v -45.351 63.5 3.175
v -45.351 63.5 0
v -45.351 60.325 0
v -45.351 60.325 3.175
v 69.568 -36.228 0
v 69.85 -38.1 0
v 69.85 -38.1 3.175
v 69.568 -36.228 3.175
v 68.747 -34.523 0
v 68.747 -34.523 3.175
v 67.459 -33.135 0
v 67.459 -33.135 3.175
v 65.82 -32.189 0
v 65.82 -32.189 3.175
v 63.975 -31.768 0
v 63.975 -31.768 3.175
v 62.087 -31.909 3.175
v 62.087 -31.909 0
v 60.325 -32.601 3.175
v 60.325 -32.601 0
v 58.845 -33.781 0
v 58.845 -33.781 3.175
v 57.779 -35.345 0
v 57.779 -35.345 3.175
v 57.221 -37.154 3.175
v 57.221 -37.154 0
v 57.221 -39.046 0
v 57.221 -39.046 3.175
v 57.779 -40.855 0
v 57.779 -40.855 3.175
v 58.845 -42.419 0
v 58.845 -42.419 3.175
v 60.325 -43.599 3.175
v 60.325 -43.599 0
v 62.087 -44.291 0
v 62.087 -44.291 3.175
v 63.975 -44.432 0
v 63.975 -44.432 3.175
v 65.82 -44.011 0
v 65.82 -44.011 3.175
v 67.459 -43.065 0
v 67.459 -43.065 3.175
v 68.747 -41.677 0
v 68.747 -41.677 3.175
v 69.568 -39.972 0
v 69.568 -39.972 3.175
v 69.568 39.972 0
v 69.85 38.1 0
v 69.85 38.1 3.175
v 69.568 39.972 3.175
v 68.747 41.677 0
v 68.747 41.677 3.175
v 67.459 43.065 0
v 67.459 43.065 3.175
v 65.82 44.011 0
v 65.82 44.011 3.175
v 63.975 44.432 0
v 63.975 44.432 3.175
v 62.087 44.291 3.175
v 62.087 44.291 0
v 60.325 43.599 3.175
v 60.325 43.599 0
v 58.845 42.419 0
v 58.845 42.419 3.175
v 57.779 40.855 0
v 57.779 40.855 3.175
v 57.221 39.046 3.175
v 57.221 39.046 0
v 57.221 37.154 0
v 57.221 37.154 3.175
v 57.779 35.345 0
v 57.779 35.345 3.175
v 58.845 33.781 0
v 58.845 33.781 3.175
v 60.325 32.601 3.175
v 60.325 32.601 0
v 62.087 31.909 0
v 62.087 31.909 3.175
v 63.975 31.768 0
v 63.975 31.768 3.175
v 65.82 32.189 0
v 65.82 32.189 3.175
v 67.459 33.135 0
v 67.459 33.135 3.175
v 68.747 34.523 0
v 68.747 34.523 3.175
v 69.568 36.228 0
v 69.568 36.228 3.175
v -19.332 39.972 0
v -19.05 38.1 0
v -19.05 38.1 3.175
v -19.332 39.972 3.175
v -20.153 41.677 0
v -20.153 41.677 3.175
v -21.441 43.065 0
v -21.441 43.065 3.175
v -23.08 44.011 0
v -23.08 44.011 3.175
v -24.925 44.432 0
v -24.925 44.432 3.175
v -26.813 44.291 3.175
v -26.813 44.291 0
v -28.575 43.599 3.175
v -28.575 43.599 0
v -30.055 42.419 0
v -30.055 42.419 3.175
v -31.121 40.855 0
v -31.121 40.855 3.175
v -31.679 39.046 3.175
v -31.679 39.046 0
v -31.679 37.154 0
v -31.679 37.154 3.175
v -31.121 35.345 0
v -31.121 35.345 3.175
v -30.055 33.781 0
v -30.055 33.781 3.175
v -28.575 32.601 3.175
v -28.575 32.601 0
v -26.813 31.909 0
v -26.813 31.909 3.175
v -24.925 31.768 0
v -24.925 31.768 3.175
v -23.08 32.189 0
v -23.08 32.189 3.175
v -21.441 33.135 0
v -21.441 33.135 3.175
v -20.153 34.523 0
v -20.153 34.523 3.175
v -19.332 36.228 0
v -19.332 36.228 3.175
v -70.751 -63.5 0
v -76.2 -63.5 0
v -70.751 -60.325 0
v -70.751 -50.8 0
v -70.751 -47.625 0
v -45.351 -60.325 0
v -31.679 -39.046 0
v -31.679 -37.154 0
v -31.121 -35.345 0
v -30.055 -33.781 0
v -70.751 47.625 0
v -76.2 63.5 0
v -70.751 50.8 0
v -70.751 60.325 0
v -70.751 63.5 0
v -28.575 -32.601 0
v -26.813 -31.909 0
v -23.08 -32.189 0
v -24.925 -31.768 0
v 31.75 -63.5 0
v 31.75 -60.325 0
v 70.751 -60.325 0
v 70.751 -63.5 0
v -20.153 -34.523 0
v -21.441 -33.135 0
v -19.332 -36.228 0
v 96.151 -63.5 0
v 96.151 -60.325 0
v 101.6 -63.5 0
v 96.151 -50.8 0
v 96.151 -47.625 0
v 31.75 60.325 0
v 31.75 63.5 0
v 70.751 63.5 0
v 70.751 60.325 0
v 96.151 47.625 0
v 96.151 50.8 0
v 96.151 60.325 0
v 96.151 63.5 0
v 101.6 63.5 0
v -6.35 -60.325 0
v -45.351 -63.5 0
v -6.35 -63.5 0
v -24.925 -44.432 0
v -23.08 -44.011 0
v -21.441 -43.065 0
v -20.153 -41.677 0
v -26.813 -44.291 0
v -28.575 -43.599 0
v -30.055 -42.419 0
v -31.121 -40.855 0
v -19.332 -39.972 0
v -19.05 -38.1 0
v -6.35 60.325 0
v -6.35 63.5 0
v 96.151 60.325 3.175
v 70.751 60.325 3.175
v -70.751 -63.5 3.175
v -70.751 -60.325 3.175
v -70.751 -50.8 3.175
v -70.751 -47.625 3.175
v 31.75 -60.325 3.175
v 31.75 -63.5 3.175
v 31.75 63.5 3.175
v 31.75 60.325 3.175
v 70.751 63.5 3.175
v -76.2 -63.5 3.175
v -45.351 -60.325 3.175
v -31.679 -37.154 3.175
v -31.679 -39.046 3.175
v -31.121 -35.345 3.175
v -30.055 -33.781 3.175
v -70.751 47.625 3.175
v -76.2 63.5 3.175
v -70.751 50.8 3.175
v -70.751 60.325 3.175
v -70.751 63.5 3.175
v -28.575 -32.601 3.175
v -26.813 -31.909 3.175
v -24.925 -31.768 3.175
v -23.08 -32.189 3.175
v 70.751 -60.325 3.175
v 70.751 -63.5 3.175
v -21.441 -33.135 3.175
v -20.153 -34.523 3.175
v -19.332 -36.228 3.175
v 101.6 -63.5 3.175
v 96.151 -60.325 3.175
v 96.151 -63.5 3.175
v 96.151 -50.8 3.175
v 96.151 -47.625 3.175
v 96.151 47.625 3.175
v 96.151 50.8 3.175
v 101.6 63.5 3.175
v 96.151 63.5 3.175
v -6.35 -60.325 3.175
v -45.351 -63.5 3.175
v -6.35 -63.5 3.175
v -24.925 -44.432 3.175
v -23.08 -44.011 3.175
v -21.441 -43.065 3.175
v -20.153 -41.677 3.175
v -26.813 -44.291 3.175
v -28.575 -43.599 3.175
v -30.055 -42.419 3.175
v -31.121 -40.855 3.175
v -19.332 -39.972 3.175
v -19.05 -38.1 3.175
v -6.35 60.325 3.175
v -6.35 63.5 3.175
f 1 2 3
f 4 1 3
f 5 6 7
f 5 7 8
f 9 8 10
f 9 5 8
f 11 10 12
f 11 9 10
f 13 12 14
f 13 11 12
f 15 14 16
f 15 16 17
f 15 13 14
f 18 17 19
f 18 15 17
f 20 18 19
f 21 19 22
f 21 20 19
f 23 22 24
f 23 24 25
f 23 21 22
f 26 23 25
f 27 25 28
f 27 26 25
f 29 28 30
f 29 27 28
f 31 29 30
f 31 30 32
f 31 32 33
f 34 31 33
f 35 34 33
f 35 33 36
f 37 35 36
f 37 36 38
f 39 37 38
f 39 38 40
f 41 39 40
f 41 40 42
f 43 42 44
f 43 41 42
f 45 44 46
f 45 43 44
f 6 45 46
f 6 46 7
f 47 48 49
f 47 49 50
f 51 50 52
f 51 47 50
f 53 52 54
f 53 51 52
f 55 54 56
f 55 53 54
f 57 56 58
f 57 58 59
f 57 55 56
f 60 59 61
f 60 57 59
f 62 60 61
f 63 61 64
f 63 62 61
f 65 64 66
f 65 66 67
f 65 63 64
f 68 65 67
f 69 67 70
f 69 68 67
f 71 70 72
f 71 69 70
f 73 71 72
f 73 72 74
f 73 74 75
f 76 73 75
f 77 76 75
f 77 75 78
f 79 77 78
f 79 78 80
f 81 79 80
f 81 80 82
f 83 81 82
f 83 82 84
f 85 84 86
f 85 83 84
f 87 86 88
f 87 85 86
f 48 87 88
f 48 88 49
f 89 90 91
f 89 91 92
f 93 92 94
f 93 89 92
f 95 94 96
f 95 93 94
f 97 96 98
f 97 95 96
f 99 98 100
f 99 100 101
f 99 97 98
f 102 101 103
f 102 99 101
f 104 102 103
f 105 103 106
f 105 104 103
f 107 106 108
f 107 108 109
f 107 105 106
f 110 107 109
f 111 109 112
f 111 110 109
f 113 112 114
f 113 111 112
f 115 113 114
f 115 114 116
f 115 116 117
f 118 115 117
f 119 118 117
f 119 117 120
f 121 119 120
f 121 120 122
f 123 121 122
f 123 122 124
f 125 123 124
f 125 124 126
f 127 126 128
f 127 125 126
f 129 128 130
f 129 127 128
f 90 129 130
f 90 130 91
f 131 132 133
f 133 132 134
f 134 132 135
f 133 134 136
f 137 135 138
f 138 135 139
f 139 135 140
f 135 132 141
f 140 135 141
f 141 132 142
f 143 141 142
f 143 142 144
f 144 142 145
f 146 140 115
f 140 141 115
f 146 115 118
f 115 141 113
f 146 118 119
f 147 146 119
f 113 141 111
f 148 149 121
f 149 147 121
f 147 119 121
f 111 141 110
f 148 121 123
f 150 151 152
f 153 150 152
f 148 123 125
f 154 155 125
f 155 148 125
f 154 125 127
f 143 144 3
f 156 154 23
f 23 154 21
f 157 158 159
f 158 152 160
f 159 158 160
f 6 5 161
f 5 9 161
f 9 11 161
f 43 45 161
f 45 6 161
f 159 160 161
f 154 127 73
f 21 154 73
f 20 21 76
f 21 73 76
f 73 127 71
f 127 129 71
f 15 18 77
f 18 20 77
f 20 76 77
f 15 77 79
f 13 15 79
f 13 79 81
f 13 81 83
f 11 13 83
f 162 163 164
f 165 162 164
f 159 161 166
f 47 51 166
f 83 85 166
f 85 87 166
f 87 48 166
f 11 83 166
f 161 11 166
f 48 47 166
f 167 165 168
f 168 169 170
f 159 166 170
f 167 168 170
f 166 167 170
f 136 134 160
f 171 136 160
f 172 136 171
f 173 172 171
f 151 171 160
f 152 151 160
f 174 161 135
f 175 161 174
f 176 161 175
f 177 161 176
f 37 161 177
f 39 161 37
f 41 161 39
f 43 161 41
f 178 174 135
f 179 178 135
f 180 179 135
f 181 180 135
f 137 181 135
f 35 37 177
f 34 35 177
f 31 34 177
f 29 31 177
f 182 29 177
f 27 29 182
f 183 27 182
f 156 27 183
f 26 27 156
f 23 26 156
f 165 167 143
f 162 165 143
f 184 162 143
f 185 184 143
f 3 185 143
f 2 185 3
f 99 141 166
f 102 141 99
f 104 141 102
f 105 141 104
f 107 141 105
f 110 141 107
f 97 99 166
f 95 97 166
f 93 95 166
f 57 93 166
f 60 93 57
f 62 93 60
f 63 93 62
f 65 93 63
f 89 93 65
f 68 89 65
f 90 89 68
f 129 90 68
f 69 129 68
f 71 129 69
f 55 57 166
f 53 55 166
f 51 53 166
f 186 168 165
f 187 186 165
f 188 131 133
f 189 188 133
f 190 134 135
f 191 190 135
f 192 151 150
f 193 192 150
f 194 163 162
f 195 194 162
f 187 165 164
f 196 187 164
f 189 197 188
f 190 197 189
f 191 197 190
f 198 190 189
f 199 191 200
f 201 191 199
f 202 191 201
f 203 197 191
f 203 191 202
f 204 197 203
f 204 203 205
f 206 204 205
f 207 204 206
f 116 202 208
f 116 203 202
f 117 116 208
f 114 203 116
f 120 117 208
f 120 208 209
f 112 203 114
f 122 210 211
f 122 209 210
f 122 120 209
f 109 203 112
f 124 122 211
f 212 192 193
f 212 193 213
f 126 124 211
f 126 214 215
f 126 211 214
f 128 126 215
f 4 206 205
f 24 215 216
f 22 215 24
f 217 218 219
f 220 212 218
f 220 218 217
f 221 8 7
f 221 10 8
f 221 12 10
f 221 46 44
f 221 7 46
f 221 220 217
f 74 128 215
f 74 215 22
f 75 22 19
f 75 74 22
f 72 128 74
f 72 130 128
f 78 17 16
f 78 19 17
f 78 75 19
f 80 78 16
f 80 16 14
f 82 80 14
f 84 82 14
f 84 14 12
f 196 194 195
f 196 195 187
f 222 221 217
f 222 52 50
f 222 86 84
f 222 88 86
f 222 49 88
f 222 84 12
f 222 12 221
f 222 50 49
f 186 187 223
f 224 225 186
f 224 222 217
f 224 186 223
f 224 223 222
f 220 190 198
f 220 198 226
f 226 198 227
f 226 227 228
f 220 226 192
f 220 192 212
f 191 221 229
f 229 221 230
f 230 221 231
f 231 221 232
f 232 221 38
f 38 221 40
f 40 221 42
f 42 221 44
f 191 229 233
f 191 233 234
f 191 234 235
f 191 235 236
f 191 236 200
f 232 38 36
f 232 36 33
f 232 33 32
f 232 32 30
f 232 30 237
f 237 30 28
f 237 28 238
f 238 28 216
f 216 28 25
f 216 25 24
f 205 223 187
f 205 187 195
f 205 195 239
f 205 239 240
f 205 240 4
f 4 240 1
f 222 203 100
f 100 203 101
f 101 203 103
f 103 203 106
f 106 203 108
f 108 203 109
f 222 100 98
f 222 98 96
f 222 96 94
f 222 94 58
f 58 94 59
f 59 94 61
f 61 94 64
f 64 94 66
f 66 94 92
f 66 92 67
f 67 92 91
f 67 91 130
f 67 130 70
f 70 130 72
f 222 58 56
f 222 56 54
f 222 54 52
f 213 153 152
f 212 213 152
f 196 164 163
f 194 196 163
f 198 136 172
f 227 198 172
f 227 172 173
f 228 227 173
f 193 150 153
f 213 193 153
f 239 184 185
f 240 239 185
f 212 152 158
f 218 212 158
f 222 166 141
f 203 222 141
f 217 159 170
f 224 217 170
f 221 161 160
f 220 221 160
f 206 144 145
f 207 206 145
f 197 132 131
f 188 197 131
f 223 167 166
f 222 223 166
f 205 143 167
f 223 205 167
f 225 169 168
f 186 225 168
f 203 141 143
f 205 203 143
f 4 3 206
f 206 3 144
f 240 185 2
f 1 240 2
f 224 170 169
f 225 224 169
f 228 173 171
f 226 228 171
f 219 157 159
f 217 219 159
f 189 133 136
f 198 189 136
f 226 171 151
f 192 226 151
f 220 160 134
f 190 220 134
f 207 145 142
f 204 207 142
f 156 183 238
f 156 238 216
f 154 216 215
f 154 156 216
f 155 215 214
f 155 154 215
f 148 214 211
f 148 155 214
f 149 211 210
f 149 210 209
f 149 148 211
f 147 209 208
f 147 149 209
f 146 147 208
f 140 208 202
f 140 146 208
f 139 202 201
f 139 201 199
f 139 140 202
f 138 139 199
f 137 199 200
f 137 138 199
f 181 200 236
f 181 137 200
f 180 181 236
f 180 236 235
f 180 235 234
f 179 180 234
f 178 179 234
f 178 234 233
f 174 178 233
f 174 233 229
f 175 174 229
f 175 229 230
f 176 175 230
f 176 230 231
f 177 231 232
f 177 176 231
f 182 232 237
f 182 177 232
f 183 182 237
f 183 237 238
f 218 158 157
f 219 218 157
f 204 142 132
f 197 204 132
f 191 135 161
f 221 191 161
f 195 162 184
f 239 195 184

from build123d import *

# Parameters (mm, degrees)
F0_R     = 6.35
F1_DEPTH = 3.175


# Not quite as in the source:
# - a feature names something its author has since deleted; it is built from what else it names


with BuildPart() as f1:
    # F0 (on Top) → F1 (new body)
    with BuildSketch(Plane.XY):
        Polygon((-70.7512, 63.5), (-76.2, 63.5), (-76.2, -63.5), (-70.7512, -63.5), (-70.7512, -60.325), (-45.3512, -60.325), (-45.3512, -63.5), (-6.35, -63.5), (-6.35, -60.325), (31.75, -60.325), (31.75, -63.5), (70.7512, -63.5), (70.7512, -60.325), (96.1512, -60.325), (96.1512, -63.5), (101.6, -63.5), (101.6, 63.5), (96.1512, 63.5), (96.1512, 60.325), (70.7512, 60.325), (70.7512, 63.5), (31.75, 63.5), (31.75, 60.325), (-6.35, 60.325), (-6.35, 63.5), (-45.3512, 63.5), (-45.3512, 60.325), (-70.7512, 60.325), align=None)
        with Locations((-25.4, -38.1)):
            Circle(F0_R, mode=Mode.SUBTRACT)
        Polygon((-70.7512, -50.8), (-70.7512, -47.625), (-45.3512, -47.625), (-6.35, -47.625), (31.75, -47.625), (70.7512, -47.625), (96.1512, -47.625), (96.1512, -50.8), (70.7512, -50.8), (31.75, -50.8), (-6.35, -50.8), (-45.3512, -50.8), align=None, mode=Mode.SUBTRACT)
        with Locations((63.5, -38.1)):
            Circle(F0_R, mode=Mode.SUBTRACT)
        with Locations((-25.4, 38.1)):
            Circle(F0_R, mode=Mode.SUBTRACT)
        Polygon((96.1512, 50.8), (96.1512, 47.625), (70.7512, 47.625), (31.75, 47.625), (-6.35, 47.625), (-45.3512, 47.625), (-70.7512, 47.625), (-70.7512, 50.8), (-45.3512, 50.8), (-6.35, 50.8), (31.75, 50.8), (70.7512, 50.8), align=None, mode=Mode.SUBTRACT)
        with Locations((63.5, 38.1)):
            Circle(F0_R, mode=Mode.SUBTRACT)
    extrude(amount=F1_DEPTH)


solid = f1.part
